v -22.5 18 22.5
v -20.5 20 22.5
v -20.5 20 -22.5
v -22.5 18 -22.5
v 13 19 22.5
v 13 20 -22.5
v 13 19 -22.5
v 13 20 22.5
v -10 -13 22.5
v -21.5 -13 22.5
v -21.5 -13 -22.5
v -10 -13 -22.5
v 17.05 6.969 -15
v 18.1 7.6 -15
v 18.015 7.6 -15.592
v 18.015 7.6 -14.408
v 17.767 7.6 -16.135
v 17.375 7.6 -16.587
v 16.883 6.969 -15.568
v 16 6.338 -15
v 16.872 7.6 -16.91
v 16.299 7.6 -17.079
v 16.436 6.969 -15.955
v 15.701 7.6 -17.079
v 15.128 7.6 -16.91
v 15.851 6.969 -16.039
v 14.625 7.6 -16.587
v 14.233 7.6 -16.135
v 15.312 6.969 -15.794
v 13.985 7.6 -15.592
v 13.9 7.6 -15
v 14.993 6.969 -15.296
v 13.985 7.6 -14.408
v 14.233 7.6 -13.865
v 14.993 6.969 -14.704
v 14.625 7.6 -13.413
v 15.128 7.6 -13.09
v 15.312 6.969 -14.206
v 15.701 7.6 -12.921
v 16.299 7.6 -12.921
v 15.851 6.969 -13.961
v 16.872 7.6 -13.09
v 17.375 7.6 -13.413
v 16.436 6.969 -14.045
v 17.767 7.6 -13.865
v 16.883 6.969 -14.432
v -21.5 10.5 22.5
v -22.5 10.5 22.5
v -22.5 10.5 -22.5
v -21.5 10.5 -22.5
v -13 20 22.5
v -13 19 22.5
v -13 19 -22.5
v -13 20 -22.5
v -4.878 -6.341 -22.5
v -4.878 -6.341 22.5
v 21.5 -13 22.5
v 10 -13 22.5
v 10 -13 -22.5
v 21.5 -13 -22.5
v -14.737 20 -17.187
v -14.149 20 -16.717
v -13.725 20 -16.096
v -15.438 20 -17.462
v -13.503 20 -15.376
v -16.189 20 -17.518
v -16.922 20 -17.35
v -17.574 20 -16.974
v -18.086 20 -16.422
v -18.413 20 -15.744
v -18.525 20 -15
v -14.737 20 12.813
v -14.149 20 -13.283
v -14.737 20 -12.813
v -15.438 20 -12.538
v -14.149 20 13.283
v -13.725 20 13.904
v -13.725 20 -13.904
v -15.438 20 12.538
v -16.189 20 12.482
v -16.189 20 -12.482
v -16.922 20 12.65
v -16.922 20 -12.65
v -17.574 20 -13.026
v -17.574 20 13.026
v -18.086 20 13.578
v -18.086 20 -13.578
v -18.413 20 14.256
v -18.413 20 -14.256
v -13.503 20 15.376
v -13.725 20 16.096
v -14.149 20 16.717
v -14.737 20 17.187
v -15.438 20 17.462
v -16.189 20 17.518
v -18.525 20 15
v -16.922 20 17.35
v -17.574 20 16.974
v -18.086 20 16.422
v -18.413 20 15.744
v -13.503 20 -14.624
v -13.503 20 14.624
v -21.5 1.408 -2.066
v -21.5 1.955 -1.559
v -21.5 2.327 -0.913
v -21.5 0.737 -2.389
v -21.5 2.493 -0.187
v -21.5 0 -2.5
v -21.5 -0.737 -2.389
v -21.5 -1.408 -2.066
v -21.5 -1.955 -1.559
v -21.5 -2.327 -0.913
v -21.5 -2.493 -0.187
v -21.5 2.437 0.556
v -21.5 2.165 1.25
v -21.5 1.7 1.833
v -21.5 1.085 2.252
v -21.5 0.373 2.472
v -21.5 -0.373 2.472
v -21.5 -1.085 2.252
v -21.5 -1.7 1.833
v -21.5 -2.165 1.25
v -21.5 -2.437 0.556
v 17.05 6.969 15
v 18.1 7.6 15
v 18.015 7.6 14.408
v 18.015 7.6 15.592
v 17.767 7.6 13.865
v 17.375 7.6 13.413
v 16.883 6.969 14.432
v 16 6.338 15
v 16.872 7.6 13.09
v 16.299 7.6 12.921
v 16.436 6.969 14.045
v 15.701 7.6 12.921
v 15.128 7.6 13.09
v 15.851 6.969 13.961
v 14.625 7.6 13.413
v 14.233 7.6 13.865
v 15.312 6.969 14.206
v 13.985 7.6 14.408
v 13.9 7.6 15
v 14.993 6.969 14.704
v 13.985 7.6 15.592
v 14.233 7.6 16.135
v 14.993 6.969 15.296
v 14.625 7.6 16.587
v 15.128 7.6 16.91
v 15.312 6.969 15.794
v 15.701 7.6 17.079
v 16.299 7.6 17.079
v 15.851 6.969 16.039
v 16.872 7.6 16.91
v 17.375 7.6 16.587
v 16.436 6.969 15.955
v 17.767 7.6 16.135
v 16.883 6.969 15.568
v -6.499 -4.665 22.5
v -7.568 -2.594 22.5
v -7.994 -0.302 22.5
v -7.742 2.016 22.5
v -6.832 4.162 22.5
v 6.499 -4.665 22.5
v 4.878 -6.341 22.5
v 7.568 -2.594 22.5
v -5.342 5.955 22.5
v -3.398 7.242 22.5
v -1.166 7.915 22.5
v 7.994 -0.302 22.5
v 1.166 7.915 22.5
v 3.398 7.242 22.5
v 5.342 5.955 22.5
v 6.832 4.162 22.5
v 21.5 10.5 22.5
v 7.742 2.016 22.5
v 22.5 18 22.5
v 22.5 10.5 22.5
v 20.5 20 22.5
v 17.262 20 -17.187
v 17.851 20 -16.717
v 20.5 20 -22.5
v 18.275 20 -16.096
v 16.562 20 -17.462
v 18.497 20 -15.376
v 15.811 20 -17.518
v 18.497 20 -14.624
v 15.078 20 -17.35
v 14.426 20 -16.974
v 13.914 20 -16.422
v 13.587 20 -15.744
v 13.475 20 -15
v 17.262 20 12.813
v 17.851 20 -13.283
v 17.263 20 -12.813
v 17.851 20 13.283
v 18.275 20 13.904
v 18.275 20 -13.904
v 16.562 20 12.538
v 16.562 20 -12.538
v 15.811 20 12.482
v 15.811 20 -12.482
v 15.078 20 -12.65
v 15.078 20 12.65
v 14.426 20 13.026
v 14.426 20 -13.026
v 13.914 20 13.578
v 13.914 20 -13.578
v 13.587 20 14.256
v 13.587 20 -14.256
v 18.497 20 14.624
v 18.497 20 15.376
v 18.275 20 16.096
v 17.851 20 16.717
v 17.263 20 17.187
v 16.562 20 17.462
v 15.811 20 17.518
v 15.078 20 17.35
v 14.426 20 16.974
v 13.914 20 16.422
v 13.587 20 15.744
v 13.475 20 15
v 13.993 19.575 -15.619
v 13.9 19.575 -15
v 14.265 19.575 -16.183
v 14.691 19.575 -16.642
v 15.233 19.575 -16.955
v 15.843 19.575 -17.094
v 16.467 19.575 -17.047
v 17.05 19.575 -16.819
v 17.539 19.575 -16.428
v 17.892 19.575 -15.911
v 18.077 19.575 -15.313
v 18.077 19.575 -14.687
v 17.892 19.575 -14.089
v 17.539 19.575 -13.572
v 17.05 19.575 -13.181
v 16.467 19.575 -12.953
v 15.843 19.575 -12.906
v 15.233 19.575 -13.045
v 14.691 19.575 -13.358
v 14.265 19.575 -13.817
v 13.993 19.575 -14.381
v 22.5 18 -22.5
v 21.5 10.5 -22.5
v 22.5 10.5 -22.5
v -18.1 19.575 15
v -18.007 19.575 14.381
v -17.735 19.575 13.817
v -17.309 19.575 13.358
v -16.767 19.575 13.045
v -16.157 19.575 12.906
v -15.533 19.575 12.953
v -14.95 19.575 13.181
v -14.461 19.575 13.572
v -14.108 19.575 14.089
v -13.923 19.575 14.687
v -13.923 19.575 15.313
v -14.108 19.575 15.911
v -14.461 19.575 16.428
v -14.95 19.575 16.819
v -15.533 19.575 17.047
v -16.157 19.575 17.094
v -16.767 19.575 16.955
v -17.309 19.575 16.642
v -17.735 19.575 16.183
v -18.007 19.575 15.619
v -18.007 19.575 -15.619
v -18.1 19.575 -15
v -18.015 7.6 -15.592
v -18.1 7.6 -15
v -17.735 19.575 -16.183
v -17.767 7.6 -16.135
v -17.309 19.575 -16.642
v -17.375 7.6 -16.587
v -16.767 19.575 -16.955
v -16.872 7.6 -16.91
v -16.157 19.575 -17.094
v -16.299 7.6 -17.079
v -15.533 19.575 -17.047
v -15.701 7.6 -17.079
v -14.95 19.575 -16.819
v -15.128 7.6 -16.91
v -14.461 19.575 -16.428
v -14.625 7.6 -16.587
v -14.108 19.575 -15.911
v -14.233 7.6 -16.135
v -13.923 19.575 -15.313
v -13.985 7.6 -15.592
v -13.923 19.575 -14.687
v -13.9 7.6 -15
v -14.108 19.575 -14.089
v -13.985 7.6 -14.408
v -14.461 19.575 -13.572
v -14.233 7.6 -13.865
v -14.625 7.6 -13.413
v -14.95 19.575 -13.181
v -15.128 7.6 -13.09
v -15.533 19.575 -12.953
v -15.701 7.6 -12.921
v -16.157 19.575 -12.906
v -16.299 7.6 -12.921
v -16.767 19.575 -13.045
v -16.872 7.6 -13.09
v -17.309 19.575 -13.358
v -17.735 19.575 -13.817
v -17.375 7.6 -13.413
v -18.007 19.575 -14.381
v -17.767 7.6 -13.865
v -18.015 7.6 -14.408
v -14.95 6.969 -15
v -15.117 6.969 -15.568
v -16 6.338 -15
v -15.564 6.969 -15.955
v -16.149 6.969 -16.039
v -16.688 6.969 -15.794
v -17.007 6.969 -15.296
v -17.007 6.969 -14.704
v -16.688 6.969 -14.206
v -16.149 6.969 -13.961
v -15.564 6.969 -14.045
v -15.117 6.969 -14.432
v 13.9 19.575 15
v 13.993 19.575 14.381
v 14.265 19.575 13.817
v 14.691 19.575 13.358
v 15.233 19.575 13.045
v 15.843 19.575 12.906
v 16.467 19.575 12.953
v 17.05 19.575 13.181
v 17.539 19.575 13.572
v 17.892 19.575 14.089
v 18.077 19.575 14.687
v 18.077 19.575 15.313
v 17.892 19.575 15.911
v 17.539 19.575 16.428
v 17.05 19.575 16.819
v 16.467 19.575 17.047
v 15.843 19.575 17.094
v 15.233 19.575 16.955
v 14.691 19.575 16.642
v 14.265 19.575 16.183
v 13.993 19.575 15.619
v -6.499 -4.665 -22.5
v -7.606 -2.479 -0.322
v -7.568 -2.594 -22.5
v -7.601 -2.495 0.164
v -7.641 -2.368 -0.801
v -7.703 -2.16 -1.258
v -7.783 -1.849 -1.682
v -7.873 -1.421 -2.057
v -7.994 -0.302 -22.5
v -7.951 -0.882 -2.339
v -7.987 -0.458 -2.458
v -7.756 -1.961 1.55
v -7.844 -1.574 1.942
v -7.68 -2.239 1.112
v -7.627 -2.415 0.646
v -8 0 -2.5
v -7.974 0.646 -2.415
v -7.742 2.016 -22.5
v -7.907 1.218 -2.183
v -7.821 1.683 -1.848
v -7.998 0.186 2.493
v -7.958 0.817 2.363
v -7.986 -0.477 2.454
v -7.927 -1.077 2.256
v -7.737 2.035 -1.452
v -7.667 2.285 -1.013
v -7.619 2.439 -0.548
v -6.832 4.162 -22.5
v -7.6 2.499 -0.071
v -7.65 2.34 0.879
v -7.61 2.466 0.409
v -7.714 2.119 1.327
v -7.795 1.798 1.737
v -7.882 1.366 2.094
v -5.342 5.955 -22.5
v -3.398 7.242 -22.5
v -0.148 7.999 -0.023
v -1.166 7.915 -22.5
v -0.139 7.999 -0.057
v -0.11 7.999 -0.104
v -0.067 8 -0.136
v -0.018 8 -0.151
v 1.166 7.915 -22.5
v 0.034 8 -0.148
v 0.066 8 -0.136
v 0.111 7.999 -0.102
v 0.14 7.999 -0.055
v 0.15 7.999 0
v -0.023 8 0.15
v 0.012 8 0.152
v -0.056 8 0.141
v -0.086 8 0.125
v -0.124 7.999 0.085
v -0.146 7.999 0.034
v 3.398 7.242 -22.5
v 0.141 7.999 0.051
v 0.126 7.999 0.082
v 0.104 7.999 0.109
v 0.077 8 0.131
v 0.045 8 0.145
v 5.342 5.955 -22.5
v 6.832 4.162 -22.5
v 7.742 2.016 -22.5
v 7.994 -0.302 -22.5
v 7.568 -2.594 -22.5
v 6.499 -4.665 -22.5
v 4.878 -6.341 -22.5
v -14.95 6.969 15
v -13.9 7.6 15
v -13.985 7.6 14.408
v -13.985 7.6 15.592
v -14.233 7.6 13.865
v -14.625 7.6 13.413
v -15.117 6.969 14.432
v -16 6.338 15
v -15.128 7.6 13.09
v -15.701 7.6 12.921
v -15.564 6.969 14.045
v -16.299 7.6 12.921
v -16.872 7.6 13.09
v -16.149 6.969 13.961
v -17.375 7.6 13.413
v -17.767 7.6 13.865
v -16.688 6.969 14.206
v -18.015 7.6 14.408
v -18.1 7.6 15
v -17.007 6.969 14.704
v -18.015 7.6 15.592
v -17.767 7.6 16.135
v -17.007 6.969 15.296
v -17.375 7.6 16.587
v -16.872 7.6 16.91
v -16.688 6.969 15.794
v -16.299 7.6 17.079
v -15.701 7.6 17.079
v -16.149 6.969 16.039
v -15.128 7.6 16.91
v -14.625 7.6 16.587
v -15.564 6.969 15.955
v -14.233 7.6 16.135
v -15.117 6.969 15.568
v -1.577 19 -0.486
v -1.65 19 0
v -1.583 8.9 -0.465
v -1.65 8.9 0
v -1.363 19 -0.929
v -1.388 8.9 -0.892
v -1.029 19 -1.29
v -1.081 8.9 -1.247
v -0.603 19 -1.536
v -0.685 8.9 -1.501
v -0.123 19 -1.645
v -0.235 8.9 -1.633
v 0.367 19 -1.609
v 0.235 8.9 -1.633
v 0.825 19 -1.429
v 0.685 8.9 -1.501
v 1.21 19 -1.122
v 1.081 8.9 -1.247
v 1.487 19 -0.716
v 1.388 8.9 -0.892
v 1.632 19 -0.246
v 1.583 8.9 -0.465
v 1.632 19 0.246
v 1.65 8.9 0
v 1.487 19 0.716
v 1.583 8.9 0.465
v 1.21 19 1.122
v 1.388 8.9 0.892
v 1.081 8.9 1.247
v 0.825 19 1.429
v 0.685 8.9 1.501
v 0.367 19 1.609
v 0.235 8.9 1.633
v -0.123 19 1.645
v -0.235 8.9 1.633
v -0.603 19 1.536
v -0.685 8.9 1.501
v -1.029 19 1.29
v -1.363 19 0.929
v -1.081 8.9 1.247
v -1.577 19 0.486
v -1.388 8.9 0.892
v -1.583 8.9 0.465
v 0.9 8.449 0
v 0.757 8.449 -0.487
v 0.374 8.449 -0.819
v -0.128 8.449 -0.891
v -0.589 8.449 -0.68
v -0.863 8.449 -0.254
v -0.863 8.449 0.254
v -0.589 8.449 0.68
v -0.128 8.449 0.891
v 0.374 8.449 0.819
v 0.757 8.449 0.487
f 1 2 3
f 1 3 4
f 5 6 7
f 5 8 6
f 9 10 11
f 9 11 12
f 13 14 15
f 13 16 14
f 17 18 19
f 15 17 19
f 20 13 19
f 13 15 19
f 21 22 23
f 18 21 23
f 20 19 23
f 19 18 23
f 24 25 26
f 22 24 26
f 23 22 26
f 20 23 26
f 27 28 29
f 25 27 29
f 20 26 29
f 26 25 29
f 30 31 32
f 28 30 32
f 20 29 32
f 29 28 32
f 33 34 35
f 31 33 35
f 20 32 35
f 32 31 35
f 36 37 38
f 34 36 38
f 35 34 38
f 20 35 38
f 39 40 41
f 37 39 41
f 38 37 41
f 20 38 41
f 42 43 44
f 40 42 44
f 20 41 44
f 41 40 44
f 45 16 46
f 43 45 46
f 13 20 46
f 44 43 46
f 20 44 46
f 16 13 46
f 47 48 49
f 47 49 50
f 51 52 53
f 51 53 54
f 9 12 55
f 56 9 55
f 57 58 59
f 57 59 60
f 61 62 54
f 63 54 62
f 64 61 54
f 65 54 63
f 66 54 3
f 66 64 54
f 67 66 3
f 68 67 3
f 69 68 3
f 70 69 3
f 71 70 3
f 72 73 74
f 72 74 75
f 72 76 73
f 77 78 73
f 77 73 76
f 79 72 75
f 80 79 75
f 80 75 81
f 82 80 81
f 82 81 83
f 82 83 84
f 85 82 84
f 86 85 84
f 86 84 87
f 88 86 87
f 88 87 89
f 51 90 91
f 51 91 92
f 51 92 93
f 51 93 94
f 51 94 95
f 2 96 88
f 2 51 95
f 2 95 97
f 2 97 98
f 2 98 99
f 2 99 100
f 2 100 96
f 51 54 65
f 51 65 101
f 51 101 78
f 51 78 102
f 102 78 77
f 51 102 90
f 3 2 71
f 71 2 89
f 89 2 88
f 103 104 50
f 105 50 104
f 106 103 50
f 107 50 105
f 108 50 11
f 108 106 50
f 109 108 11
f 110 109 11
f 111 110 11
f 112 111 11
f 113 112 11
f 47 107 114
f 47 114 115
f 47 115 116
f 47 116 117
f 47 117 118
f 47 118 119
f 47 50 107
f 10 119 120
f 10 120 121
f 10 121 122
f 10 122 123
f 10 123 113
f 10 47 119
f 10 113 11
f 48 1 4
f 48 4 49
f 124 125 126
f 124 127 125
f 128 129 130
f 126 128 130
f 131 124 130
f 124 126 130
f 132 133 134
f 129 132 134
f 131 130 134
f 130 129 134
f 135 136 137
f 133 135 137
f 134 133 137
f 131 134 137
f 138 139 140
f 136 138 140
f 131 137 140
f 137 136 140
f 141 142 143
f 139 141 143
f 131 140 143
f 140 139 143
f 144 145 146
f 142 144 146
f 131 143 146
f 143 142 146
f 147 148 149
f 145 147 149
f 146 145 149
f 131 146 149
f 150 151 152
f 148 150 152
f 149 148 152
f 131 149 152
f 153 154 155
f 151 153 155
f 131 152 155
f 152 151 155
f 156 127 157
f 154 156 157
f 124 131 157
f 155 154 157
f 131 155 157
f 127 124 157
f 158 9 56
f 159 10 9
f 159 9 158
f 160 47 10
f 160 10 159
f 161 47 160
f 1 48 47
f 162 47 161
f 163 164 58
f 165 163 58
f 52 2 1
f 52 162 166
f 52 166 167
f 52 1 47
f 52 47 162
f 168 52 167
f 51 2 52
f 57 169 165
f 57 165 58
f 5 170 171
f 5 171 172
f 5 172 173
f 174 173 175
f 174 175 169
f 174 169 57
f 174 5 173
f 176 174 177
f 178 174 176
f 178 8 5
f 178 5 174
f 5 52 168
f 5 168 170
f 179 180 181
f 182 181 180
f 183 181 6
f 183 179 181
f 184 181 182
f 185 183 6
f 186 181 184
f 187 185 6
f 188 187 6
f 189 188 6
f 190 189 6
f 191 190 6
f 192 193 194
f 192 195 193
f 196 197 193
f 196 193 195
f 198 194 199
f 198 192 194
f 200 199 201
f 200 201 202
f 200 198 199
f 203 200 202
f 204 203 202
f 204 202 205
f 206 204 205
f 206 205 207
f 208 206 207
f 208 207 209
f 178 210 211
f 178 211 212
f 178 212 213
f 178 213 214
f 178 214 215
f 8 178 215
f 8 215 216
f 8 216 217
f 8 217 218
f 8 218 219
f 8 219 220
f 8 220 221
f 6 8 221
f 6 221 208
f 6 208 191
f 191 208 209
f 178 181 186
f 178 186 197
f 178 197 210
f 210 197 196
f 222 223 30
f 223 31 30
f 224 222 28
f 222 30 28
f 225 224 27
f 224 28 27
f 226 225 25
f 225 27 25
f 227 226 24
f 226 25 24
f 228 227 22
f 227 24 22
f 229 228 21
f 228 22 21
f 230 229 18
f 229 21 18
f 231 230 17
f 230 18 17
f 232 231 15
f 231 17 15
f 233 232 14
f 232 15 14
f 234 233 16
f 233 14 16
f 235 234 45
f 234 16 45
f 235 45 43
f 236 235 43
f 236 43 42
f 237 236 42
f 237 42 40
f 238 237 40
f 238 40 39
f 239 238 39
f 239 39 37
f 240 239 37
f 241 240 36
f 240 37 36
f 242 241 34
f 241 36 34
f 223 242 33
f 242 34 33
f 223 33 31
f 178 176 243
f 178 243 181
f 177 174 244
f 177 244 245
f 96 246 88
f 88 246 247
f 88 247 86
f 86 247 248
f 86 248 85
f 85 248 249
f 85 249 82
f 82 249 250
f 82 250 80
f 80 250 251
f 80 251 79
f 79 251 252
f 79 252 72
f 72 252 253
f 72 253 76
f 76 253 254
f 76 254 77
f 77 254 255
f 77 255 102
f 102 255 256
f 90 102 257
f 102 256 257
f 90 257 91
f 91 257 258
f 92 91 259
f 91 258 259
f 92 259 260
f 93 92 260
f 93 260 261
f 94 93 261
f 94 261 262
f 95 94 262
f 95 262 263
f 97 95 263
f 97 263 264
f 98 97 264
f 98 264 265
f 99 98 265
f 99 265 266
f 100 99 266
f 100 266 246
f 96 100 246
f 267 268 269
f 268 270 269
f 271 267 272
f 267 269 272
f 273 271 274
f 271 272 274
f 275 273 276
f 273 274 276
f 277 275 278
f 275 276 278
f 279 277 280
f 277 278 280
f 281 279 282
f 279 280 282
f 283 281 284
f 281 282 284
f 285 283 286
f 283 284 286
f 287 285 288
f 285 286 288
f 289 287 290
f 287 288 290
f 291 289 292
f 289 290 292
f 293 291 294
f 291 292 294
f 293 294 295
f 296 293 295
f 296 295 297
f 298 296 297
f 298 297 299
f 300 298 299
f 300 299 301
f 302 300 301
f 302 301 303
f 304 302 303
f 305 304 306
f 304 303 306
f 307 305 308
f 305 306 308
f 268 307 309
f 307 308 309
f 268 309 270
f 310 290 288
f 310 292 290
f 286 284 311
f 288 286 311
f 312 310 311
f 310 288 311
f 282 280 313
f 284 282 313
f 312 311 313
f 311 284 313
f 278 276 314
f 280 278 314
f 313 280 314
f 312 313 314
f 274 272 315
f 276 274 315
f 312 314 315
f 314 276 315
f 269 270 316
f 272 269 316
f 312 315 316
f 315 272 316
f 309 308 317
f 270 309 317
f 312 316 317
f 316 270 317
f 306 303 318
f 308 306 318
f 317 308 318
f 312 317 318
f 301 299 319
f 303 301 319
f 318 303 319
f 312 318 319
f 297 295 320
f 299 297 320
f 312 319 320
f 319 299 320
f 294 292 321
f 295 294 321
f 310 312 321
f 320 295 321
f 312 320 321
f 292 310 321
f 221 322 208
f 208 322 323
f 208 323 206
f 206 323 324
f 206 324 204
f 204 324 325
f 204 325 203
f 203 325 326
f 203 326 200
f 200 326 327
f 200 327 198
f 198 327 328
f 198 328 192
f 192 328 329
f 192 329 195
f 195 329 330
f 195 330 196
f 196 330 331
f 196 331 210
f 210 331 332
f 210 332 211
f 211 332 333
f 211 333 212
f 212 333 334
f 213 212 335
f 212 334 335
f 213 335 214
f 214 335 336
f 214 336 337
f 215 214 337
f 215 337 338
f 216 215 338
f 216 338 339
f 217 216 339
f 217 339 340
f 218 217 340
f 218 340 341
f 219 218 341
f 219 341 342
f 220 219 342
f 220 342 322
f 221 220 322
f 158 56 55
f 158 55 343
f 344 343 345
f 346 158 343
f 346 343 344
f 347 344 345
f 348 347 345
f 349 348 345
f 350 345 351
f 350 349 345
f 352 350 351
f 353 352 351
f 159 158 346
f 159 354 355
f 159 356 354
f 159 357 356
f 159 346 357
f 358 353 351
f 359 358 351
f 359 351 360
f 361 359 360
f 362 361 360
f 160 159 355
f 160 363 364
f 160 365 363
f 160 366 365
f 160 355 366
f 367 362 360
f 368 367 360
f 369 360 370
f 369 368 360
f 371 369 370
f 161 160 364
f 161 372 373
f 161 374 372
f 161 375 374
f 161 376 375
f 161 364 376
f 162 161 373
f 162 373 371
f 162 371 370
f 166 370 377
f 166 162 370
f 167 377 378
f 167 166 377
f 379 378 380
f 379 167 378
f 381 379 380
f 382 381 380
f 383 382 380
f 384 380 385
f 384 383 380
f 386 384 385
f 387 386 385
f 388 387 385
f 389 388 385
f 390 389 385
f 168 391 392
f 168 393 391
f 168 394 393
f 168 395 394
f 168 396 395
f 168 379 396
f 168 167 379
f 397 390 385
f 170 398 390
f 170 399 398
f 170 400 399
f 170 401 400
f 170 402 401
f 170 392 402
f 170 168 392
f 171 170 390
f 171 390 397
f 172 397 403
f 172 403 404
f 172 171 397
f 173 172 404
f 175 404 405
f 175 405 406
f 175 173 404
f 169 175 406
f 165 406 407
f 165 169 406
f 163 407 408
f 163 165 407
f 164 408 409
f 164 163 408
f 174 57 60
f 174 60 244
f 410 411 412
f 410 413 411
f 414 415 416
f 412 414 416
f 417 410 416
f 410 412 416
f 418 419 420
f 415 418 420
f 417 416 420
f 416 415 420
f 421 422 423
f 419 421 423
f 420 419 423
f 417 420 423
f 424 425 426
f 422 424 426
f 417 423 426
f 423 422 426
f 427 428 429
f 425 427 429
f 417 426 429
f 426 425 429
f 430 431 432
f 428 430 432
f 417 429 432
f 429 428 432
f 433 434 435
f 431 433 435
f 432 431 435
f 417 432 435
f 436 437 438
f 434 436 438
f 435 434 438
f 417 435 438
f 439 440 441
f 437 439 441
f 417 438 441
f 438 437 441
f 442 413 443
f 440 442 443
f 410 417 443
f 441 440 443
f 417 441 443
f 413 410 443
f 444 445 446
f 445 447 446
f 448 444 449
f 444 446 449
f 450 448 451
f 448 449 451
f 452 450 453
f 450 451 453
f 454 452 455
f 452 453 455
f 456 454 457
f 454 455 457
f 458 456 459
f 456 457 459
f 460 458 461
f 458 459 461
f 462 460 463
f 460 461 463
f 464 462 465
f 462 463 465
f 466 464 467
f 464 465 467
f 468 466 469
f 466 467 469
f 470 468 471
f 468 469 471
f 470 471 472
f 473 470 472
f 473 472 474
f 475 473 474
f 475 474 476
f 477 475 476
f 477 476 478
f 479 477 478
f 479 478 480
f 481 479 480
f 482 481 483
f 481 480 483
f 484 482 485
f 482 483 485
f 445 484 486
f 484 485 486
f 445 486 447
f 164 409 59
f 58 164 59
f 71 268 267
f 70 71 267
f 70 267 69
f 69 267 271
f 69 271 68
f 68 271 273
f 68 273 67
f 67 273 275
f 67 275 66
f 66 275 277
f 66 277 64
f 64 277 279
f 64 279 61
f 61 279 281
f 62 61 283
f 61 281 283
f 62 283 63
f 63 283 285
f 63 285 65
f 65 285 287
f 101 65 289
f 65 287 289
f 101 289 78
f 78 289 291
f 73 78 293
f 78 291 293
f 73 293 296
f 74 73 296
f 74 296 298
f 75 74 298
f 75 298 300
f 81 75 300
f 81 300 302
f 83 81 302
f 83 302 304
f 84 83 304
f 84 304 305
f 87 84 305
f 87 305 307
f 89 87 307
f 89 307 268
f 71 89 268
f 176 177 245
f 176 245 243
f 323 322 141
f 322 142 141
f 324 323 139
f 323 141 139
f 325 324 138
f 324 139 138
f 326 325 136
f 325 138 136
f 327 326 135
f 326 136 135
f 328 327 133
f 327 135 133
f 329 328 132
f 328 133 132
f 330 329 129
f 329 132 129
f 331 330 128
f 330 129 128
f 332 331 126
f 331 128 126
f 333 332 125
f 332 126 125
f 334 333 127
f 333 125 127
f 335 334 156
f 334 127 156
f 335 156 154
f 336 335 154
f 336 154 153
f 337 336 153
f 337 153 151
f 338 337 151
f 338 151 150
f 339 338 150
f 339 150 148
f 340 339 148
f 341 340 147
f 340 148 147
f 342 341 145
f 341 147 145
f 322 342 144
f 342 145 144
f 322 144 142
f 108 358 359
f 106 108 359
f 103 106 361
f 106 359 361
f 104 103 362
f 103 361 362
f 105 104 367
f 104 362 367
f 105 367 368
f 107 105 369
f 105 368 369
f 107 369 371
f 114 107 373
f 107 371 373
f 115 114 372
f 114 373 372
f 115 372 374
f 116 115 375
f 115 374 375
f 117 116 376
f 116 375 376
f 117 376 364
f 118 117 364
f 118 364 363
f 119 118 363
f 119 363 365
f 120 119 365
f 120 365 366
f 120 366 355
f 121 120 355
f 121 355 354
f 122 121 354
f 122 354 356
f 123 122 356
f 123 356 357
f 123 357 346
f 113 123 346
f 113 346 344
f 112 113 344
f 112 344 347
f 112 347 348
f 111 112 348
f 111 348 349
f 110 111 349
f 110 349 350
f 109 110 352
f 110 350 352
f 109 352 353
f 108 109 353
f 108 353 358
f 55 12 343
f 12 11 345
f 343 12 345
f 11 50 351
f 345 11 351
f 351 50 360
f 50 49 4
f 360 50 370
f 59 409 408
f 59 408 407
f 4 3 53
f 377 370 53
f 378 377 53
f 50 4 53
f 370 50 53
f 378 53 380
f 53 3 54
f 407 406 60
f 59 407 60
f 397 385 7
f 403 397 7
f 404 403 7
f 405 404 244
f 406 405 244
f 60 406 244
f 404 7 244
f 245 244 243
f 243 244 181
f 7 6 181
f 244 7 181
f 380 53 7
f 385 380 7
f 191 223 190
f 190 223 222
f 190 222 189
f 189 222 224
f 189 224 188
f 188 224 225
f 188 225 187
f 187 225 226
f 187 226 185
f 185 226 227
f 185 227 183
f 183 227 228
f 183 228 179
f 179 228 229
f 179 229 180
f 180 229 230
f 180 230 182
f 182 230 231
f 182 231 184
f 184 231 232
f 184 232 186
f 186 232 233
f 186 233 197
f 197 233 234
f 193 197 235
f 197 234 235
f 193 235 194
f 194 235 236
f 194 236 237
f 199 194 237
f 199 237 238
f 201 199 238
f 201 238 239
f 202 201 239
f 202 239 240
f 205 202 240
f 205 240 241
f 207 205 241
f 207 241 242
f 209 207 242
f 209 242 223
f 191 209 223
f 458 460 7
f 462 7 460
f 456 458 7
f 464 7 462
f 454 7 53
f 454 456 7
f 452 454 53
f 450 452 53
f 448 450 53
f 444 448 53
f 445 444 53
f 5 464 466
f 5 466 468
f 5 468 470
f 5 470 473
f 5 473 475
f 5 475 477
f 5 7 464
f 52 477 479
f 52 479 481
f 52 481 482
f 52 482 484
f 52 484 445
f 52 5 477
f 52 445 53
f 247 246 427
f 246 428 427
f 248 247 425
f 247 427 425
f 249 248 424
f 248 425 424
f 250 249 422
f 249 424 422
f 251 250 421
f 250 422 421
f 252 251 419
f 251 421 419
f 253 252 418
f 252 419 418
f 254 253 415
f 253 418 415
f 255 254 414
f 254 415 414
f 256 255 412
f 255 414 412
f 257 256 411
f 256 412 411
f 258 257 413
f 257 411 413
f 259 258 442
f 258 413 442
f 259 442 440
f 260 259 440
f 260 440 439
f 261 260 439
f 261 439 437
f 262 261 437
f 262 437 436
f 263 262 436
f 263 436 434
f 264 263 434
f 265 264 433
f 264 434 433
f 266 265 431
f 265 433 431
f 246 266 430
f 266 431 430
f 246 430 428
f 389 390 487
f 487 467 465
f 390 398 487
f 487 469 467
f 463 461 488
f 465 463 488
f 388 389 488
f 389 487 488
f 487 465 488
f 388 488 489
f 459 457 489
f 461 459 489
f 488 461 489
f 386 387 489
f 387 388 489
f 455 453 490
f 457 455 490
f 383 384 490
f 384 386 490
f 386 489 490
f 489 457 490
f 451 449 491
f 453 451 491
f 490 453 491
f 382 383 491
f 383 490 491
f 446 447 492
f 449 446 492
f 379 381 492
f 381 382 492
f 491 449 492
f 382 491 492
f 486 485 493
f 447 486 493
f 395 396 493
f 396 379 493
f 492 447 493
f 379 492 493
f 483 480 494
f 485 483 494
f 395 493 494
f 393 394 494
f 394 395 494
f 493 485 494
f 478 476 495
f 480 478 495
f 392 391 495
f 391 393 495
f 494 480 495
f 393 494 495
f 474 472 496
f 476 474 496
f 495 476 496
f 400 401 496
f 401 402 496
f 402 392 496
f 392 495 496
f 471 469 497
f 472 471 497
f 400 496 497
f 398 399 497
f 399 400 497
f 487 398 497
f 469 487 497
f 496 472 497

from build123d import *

# Parameters (mm, degrees)
BOSS_EXTRUDE1_DEPTH         = 22.5
M5_TAPPED_HOLE1_D           = 4.2
M5_TAPPED_HOLE1_DEPTH       = 12.4
M5_TAPPED_HOLE1_CSINK_D     = 5.05
M5_TAPPED_HOLE1_CSINK_ANGLE = 90
M5_TAPPED_HOLE1_TIP         = 1.2618073
M4X0_7_TAPPED_HOLE1_D       = 3.3
M4X0_7_TAPPED_HOLE1_DEPTH   = 10.1
M4X0_7_TAPPED_HOLE1_TIP     = 0.991420021
M6X1_0_TAPPED_HOLE1_D       = 5
M6X1_0_TAPPED_HOLE1_DEPTH   = 15
M6X1_0_TAPPED_HOLE1_TIP     = 1.502151548


with BuildPart() as part:
    # Sketch2 → Boss-Extrude1 (new body, symmetric)
    with BuildSketch(Plane.XY):
        with BuildLine():
            Line((13, 19), (-13, 19))
            Line((-13, 19), (-13, 20))
            Line((-13, 20), (-20.5, 20))
            Line((-20.5, 20), (-22.5, 18))
            Line((-22.5, 18), (-22.5, 10.5))
            Line((-22.5, 10.5), (-21.5, 10.5))
            Line((-21.5, 10.5), (-21.5, -13))
            Line((-21.5, -13), (-10, -13))
            Line((-10, -13), (-4.877686087, -6.340991913))
            ThreePointArc((-4.877686087, -6.340991913), (0, 8), (4.877686087, -6.340991913))
            Line((4.877686087, -6.340991913), (10, -13))
            Line((10, -13), (21.5, -13))
            Line((21.5, -13), (21.5, 10.5))
            Line((21.5, 10.5), (22.5, 10.5))
            Line((22.5, 10.5), (22.5, 18))
            Line((22.5, 18), (20.5, 20))
            Line((20.5, 20), (13, 20))
            Line((13, 20), (13, 19))
        make_face()
    extrude(amount=BOSS_EXTRUDE1_DEPTH, both=True)

    # M5 Tapped Hole1
    with Locations(Plane(origin=(0, 20, 0), x_dir=(1, 0, 0), z_dir=(0, 1, 0))):
        with Locations((-16, 15), (16, 15), (-16, -15), (16, -15)):
            CounterSinkHole(M5_TAPPED_HOLE1_D / 2, M5_TAPPED_HOLE1_CSINK_D / 2, depth=M5_TAPPED_HOLE1_DEPTH, counter_sink_angle=M5_TAPPED_HOLE1_CSINK_ANGLE)
            with Locations((0, 0, -(M5_TAPPED_HOLE1_DEPTH + M5_TAPPED_HOLE1_TIP / 2))):  # 118° drill point
                Cone(0, M5_TAPPED_HOLE1_D / 2, M5_TAPPED_HOLE1_TIP, mode=Mode.SUBTRACT)

    # M4x0.7 Tapped Hole1
    with Locations(Plane(origin=(0, 19, 0), x_dir=(1, 0, 0), z_dir=(0, 1, 0))):
        with Locations((0, 0)):
            Hole(M4X0_7_TAPPED_HOLE1_D / 2, depth=M4X0_7_TAPPED_HOLE1_DEPTH)
            with Locations((0, 0, -(M4X0_7_TAPPED_HOLE1_DEPTH + M4X0_7_TAPPED_HOLE1_TIP / 2))):  # 118° drill point
                Cone(0, M4X0_7_TAPPED_HOLE1_D / 2, M4X0_7_TAPPED_HOLE1_TIP, mode=Mode.SUBTRACT)

    # M6x1.0 Tapped Hole1
    with Locations(Plane.ZY.offset(21.5)):
        with Locations((0, 0)):
            Hole(M6X1_0_TAPPED_HOLE1_D / 2, depth=M6X1_0_TAPPED_HOLE1_DEPTH)
            with Locations((0, 0, -(M6X1_0_TAPPED_HOLE1_DEPTH + M6X1_0_TAPPED_HOLE1_TIP / 2))):  # 118° drill point
                Cone(0, M6X1_0_TAPPED_HOLE1_D / 2, M6X1_0_TAPPED_HOLE1_TIP, mode=Mode.SUBTRACT)


solid = part.part
